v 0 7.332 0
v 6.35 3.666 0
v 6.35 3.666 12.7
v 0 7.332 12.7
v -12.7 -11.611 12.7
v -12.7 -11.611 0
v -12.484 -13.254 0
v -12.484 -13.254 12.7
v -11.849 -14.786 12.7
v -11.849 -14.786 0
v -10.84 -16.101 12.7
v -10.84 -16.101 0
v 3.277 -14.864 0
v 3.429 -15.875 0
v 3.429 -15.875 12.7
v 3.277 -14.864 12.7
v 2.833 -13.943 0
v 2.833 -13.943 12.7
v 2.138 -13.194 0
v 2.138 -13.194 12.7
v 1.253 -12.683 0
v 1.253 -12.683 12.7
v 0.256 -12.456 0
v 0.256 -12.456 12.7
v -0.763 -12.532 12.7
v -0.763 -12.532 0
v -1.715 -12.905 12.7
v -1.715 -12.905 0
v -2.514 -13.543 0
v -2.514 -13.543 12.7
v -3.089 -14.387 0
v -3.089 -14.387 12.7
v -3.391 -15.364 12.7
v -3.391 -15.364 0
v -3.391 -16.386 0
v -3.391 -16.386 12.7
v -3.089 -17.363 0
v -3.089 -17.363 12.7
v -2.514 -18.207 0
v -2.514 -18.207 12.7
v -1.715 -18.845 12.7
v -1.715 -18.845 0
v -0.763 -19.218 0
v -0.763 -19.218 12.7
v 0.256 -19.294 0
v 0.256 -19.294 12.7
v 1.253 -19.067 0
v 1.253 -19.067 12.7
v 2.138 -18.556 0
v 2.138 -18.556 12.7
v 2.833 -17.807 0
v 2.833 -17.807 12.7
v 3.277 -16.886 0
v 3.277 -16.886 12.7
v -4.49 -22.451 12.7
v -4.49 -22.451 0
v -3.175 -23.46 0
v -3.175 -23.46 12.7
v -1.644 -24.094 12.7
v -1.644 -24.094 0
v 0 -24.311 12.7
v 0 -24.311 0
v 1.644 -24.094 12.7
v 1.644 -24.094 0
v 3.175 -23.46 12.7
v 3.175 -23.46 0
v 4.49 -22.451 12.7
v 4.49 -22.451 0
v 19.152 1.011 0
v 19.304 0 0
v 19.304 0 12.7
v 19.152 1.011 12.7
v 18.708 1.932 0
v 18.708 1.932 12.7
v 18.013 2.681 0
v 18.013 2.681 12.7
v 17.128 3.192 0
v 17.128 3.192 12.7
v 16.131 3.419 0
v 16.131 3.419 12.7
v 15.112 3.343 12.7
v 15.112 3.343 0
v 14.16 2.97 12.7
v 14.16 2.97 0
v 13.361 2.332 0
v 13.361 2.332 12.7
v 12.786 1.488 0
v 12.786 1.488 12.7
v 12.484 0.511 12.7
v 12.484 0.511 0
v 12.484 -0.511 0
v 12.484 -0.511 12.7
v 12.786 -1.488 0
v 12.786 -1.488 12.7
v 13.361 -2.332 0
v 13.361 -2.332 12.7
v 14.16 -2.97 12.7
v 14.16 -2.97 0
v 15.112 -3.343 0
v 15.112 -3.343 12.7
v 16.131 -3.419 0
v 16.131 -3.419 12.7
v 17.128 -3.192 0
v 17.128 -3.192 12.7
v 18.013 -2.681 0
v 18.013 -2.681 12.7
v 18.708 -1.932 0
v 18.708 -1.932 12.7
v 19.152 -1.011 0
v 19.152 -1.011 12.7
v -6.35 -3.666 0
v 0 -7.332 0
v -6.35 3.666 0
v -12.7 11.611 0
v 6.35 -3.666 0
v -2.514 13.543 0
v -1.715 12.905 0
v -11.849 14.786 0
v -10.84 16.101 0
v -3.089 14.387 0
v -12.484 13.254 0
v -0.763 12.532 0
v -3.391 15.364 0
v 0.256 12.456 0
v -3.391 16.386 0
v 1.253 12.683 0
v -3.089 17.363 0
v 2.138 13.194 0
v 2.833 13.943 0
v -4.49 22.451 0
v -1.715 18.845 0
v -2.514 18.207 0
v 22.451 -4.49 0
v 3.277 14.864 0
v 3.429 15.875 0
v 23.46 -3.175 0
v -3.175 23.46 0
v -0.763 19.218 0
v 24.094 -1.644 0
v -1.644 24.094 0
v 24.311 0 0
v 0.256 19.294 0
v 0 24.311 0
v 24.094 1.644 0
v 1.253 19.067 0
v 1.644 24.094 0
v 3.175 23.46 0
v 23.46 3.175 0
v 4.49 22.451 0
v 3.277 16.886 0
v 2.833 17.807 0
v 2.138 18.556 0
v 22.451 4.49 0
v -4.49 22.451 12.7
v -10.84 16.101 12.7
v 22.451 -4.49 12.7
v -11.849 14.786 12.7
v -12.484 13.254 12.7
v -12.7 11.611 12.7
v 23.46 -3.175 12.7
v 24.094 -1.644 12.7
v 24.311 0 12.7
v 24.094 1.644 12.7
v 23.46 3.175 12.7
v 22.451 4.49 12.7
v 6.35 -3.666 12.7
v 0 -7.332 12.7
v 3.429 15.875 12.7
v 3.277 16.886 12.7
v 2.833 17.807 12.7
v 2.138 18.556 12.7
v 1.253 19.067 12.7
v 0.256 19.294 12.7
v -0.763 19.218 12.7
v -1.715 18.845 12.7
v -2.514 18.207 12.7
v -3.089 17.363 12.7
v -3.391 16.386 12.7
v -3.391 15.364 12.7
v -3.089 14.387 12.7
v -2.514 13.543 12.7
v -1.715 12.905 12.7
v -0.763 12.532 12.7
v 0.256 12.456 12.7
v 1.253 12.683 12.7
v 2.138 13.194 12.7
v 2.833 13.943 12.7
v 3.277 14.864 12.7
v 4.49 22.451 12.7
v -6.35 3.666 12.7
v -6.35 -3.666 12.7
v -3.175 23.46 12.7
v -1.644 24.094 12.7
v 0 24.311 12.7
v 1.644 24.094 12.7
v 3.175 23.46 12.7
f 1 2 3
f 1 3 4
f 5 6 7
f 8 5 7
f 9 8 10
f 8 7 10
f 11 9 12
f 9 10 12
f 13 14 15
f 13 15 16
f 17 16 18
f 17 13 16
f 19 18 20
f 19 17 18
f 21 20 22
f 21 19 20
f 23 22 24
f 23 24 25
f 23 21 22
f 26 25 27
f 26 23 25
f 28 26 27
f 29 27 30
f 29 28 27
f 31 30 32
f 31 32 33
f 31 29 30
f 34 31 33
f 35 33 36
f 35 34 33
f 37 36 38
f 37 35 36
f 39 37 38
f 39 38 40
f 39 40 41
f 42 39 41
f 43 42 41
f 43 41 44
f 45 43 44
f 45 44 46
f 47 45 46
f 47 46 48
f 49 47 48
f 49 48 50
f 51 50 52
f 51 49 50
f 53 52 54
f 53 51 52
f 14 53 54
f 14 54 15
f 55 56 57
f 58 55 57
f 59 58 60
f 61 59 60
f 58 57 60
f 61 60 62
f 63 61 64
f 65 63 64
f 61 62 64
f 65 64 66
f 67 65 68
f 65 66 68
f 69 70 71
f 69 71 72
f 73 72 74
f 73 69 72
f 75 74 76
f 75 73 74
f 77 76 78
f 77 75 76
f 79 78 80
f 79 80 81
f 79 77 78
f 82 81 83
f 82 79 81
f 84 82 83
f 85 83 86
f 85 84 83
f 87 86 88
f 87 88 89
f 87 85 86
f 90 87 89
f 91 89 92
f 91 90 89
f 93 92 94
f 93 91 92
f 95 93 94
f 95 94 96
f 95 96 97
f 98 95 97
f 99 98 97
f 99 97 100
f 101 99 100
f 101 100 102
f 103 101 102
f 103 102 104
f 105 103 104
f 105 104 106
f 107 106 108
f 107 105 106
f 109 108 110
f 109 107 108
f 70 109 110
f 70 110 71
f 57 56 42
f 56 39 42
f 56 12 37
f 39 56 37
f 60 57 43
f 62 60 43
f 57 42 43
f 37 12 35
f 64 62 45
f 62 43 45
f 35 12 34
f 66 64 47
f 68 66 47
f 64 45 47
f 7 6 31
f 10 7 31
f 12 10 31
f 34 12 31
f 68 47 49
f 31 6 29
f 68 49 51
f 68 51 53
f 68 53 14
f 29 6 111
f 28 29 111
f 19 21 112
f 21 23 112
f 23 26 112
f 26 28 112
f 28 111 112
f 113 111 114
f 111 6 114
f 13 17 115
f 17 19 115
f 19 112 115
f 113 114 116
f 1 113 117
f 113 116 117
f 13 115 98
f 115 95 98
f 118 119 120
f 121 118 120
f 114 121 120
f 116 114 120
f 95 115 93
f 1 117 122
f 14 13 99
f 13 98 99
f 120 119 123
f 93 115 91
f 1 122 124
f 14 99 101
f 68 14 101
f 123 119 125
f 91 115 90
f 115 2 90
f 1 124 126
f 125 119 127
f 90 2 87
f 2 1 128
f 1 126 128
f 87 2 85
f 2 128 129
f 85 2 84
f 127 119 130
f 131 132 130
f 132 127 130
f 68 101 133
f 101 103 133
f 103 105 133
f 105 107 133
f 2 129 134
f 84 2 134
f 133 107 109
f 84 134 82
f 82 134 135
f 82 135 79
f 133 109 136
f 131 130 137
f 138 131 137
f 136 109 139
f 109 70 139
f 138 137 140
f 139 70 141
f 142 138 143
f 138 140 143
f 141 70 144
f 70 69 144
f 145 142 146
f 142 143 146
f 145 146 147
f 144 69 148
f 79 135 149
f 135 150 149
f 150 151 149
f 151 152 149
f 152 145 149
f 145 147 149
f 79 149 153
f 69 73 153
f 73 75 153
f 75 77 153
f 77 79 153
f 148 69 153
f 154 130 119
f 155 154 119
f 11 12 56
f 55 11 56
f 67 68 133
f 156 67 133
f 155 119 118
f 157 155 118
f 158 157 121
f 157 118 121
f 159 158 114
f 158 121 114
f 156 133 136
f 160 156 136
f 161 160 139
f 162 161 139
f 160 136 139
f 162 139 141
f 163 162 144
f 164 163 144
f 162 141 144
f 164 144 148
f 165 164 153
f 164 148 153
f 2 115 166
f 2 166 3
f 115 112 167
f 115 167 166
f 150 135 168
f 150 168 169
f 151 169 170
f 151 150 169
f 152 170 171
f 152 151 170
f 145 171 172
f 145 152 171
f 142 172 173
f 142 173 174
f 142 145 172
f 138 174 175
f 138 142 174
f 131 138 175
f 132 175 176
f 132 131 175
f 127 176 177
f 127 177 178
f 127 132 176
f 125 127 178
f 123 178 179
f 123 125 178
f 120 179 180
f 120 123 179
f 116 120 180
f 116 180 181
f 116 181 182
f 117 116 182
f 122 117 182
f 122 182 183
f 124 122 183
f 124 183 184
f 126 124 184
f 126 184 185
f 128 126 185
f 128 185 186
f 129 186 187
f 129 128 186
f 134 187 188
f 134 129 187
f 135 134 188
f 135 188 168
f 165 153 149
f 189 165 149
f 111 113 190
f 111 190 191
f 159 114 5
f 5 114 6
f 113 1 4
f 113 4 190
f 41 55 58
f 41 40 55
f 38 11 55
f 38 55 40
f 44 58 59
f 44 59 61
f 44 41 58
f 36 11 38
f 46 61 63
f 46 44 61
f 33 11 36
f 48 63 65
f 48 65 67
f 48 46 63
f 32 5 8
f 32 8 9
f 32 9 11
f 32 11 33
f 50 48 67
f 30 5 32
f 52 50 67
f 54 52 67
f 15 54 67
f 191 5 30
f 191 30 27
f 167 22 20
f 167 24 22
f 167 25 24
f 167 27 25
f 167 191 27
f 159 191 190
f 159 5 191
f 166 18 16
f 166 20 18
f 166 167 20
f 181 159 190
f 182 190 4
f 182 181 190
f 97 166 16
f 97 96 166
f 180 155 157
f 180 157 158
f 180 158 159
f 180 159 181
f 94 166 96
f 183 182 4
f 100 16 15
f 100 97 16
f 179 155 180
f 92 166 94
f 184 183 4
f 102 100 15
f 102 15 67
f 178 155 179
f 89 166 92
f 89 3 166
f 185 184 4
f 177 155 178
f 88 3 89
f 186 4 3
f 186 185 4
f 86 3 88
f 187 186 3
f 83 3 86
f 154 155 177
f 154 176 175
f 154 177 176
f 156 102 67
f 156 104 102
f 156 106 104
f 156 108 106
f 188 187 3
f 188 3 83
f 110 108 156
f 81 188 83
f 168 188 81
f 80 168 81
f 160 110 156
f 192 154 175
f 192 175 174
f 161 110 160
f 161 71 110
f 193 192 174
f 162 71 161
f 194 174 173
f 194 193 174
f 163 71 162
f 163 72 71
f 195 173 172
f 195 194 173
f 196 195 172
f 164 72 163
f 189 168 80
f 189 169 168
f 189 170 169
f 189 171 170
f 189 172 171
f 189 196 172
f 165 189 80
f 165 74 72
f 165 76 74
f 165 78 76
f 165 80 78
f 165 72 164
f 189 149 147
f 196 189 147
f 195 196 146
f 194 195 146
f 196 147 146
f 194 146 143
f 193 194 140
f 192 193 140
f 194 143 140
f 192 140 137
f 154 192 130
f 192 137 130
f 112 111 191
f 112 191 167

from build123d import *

# Parameters (mm, degrees)
SKETCH2_R           = 3.429
BOSS_EXTRUDE1_DEPTH = 12.7


with BuildPart() as part:
    # Sketch2 → Boss-Extrude1 (new body)
    with BuildSketch(Plane.XY):
        with BuildLine():
            Line((-4.490128061, 22.450640303), (-10.840128061, 16.100640303))
            ThreePointArc((-10.840128061, 16.100640303), (-12.216635031, 14.040552038), (-12.7, 11.610512242))
            Line((-12.7, 11.610512242), (-12.7, -11.610512242))
            ThreePointArc((-12.7, -11.610512242), (-12.216635031, -14.040552038), (-10.840128061, -16.100640303))
            Line((-10.840128061, -16.100640303), (-4.490128061, -22.450640303))
            ThreePointArc((-4.490128061, -22.450640303), (0, -24.310512242), (4.490128061, -22.450640303))
            Line((4.490128061, -22.450640303), (22.450640303, -4.490128061))
            ThreePointArc((22.450640303, -4.490128061), (24.310512242, 0), (22.450640303, 4.490128061))
            Line((22.450640303, 4.490128061), (4.490128061, 22.450640303))
            ThreePointArc((4.490128061, 22.450640303), (0, 24.310512242), (-4.490128061, 22.450640303))
        make_face()
        with Locations((0, 15.875)):
            Circle(SKETCH2_R, mode=Mode.SUBTRACT)
        with Locations((15.875, 0)):
            Circle(SKETCH2_R, mode=Mode.SUBTRACT)
        with Locations((0, -15.875)):
            Circle(SKETCH2_R, mode=Mode.SUBTRACT)
        Polygon((6.35, 3.666174209), (0, 7.332348419), (-6.35, 3.666174209), (-6.35, -3.666174209), (0, -7.332348419), (6.35, -3.666174209), align=None, mode=Mode.SUBTRACT)
    extrude(amount=BOSS_EXTRUDE1_DEPTH)


solid = part.part
